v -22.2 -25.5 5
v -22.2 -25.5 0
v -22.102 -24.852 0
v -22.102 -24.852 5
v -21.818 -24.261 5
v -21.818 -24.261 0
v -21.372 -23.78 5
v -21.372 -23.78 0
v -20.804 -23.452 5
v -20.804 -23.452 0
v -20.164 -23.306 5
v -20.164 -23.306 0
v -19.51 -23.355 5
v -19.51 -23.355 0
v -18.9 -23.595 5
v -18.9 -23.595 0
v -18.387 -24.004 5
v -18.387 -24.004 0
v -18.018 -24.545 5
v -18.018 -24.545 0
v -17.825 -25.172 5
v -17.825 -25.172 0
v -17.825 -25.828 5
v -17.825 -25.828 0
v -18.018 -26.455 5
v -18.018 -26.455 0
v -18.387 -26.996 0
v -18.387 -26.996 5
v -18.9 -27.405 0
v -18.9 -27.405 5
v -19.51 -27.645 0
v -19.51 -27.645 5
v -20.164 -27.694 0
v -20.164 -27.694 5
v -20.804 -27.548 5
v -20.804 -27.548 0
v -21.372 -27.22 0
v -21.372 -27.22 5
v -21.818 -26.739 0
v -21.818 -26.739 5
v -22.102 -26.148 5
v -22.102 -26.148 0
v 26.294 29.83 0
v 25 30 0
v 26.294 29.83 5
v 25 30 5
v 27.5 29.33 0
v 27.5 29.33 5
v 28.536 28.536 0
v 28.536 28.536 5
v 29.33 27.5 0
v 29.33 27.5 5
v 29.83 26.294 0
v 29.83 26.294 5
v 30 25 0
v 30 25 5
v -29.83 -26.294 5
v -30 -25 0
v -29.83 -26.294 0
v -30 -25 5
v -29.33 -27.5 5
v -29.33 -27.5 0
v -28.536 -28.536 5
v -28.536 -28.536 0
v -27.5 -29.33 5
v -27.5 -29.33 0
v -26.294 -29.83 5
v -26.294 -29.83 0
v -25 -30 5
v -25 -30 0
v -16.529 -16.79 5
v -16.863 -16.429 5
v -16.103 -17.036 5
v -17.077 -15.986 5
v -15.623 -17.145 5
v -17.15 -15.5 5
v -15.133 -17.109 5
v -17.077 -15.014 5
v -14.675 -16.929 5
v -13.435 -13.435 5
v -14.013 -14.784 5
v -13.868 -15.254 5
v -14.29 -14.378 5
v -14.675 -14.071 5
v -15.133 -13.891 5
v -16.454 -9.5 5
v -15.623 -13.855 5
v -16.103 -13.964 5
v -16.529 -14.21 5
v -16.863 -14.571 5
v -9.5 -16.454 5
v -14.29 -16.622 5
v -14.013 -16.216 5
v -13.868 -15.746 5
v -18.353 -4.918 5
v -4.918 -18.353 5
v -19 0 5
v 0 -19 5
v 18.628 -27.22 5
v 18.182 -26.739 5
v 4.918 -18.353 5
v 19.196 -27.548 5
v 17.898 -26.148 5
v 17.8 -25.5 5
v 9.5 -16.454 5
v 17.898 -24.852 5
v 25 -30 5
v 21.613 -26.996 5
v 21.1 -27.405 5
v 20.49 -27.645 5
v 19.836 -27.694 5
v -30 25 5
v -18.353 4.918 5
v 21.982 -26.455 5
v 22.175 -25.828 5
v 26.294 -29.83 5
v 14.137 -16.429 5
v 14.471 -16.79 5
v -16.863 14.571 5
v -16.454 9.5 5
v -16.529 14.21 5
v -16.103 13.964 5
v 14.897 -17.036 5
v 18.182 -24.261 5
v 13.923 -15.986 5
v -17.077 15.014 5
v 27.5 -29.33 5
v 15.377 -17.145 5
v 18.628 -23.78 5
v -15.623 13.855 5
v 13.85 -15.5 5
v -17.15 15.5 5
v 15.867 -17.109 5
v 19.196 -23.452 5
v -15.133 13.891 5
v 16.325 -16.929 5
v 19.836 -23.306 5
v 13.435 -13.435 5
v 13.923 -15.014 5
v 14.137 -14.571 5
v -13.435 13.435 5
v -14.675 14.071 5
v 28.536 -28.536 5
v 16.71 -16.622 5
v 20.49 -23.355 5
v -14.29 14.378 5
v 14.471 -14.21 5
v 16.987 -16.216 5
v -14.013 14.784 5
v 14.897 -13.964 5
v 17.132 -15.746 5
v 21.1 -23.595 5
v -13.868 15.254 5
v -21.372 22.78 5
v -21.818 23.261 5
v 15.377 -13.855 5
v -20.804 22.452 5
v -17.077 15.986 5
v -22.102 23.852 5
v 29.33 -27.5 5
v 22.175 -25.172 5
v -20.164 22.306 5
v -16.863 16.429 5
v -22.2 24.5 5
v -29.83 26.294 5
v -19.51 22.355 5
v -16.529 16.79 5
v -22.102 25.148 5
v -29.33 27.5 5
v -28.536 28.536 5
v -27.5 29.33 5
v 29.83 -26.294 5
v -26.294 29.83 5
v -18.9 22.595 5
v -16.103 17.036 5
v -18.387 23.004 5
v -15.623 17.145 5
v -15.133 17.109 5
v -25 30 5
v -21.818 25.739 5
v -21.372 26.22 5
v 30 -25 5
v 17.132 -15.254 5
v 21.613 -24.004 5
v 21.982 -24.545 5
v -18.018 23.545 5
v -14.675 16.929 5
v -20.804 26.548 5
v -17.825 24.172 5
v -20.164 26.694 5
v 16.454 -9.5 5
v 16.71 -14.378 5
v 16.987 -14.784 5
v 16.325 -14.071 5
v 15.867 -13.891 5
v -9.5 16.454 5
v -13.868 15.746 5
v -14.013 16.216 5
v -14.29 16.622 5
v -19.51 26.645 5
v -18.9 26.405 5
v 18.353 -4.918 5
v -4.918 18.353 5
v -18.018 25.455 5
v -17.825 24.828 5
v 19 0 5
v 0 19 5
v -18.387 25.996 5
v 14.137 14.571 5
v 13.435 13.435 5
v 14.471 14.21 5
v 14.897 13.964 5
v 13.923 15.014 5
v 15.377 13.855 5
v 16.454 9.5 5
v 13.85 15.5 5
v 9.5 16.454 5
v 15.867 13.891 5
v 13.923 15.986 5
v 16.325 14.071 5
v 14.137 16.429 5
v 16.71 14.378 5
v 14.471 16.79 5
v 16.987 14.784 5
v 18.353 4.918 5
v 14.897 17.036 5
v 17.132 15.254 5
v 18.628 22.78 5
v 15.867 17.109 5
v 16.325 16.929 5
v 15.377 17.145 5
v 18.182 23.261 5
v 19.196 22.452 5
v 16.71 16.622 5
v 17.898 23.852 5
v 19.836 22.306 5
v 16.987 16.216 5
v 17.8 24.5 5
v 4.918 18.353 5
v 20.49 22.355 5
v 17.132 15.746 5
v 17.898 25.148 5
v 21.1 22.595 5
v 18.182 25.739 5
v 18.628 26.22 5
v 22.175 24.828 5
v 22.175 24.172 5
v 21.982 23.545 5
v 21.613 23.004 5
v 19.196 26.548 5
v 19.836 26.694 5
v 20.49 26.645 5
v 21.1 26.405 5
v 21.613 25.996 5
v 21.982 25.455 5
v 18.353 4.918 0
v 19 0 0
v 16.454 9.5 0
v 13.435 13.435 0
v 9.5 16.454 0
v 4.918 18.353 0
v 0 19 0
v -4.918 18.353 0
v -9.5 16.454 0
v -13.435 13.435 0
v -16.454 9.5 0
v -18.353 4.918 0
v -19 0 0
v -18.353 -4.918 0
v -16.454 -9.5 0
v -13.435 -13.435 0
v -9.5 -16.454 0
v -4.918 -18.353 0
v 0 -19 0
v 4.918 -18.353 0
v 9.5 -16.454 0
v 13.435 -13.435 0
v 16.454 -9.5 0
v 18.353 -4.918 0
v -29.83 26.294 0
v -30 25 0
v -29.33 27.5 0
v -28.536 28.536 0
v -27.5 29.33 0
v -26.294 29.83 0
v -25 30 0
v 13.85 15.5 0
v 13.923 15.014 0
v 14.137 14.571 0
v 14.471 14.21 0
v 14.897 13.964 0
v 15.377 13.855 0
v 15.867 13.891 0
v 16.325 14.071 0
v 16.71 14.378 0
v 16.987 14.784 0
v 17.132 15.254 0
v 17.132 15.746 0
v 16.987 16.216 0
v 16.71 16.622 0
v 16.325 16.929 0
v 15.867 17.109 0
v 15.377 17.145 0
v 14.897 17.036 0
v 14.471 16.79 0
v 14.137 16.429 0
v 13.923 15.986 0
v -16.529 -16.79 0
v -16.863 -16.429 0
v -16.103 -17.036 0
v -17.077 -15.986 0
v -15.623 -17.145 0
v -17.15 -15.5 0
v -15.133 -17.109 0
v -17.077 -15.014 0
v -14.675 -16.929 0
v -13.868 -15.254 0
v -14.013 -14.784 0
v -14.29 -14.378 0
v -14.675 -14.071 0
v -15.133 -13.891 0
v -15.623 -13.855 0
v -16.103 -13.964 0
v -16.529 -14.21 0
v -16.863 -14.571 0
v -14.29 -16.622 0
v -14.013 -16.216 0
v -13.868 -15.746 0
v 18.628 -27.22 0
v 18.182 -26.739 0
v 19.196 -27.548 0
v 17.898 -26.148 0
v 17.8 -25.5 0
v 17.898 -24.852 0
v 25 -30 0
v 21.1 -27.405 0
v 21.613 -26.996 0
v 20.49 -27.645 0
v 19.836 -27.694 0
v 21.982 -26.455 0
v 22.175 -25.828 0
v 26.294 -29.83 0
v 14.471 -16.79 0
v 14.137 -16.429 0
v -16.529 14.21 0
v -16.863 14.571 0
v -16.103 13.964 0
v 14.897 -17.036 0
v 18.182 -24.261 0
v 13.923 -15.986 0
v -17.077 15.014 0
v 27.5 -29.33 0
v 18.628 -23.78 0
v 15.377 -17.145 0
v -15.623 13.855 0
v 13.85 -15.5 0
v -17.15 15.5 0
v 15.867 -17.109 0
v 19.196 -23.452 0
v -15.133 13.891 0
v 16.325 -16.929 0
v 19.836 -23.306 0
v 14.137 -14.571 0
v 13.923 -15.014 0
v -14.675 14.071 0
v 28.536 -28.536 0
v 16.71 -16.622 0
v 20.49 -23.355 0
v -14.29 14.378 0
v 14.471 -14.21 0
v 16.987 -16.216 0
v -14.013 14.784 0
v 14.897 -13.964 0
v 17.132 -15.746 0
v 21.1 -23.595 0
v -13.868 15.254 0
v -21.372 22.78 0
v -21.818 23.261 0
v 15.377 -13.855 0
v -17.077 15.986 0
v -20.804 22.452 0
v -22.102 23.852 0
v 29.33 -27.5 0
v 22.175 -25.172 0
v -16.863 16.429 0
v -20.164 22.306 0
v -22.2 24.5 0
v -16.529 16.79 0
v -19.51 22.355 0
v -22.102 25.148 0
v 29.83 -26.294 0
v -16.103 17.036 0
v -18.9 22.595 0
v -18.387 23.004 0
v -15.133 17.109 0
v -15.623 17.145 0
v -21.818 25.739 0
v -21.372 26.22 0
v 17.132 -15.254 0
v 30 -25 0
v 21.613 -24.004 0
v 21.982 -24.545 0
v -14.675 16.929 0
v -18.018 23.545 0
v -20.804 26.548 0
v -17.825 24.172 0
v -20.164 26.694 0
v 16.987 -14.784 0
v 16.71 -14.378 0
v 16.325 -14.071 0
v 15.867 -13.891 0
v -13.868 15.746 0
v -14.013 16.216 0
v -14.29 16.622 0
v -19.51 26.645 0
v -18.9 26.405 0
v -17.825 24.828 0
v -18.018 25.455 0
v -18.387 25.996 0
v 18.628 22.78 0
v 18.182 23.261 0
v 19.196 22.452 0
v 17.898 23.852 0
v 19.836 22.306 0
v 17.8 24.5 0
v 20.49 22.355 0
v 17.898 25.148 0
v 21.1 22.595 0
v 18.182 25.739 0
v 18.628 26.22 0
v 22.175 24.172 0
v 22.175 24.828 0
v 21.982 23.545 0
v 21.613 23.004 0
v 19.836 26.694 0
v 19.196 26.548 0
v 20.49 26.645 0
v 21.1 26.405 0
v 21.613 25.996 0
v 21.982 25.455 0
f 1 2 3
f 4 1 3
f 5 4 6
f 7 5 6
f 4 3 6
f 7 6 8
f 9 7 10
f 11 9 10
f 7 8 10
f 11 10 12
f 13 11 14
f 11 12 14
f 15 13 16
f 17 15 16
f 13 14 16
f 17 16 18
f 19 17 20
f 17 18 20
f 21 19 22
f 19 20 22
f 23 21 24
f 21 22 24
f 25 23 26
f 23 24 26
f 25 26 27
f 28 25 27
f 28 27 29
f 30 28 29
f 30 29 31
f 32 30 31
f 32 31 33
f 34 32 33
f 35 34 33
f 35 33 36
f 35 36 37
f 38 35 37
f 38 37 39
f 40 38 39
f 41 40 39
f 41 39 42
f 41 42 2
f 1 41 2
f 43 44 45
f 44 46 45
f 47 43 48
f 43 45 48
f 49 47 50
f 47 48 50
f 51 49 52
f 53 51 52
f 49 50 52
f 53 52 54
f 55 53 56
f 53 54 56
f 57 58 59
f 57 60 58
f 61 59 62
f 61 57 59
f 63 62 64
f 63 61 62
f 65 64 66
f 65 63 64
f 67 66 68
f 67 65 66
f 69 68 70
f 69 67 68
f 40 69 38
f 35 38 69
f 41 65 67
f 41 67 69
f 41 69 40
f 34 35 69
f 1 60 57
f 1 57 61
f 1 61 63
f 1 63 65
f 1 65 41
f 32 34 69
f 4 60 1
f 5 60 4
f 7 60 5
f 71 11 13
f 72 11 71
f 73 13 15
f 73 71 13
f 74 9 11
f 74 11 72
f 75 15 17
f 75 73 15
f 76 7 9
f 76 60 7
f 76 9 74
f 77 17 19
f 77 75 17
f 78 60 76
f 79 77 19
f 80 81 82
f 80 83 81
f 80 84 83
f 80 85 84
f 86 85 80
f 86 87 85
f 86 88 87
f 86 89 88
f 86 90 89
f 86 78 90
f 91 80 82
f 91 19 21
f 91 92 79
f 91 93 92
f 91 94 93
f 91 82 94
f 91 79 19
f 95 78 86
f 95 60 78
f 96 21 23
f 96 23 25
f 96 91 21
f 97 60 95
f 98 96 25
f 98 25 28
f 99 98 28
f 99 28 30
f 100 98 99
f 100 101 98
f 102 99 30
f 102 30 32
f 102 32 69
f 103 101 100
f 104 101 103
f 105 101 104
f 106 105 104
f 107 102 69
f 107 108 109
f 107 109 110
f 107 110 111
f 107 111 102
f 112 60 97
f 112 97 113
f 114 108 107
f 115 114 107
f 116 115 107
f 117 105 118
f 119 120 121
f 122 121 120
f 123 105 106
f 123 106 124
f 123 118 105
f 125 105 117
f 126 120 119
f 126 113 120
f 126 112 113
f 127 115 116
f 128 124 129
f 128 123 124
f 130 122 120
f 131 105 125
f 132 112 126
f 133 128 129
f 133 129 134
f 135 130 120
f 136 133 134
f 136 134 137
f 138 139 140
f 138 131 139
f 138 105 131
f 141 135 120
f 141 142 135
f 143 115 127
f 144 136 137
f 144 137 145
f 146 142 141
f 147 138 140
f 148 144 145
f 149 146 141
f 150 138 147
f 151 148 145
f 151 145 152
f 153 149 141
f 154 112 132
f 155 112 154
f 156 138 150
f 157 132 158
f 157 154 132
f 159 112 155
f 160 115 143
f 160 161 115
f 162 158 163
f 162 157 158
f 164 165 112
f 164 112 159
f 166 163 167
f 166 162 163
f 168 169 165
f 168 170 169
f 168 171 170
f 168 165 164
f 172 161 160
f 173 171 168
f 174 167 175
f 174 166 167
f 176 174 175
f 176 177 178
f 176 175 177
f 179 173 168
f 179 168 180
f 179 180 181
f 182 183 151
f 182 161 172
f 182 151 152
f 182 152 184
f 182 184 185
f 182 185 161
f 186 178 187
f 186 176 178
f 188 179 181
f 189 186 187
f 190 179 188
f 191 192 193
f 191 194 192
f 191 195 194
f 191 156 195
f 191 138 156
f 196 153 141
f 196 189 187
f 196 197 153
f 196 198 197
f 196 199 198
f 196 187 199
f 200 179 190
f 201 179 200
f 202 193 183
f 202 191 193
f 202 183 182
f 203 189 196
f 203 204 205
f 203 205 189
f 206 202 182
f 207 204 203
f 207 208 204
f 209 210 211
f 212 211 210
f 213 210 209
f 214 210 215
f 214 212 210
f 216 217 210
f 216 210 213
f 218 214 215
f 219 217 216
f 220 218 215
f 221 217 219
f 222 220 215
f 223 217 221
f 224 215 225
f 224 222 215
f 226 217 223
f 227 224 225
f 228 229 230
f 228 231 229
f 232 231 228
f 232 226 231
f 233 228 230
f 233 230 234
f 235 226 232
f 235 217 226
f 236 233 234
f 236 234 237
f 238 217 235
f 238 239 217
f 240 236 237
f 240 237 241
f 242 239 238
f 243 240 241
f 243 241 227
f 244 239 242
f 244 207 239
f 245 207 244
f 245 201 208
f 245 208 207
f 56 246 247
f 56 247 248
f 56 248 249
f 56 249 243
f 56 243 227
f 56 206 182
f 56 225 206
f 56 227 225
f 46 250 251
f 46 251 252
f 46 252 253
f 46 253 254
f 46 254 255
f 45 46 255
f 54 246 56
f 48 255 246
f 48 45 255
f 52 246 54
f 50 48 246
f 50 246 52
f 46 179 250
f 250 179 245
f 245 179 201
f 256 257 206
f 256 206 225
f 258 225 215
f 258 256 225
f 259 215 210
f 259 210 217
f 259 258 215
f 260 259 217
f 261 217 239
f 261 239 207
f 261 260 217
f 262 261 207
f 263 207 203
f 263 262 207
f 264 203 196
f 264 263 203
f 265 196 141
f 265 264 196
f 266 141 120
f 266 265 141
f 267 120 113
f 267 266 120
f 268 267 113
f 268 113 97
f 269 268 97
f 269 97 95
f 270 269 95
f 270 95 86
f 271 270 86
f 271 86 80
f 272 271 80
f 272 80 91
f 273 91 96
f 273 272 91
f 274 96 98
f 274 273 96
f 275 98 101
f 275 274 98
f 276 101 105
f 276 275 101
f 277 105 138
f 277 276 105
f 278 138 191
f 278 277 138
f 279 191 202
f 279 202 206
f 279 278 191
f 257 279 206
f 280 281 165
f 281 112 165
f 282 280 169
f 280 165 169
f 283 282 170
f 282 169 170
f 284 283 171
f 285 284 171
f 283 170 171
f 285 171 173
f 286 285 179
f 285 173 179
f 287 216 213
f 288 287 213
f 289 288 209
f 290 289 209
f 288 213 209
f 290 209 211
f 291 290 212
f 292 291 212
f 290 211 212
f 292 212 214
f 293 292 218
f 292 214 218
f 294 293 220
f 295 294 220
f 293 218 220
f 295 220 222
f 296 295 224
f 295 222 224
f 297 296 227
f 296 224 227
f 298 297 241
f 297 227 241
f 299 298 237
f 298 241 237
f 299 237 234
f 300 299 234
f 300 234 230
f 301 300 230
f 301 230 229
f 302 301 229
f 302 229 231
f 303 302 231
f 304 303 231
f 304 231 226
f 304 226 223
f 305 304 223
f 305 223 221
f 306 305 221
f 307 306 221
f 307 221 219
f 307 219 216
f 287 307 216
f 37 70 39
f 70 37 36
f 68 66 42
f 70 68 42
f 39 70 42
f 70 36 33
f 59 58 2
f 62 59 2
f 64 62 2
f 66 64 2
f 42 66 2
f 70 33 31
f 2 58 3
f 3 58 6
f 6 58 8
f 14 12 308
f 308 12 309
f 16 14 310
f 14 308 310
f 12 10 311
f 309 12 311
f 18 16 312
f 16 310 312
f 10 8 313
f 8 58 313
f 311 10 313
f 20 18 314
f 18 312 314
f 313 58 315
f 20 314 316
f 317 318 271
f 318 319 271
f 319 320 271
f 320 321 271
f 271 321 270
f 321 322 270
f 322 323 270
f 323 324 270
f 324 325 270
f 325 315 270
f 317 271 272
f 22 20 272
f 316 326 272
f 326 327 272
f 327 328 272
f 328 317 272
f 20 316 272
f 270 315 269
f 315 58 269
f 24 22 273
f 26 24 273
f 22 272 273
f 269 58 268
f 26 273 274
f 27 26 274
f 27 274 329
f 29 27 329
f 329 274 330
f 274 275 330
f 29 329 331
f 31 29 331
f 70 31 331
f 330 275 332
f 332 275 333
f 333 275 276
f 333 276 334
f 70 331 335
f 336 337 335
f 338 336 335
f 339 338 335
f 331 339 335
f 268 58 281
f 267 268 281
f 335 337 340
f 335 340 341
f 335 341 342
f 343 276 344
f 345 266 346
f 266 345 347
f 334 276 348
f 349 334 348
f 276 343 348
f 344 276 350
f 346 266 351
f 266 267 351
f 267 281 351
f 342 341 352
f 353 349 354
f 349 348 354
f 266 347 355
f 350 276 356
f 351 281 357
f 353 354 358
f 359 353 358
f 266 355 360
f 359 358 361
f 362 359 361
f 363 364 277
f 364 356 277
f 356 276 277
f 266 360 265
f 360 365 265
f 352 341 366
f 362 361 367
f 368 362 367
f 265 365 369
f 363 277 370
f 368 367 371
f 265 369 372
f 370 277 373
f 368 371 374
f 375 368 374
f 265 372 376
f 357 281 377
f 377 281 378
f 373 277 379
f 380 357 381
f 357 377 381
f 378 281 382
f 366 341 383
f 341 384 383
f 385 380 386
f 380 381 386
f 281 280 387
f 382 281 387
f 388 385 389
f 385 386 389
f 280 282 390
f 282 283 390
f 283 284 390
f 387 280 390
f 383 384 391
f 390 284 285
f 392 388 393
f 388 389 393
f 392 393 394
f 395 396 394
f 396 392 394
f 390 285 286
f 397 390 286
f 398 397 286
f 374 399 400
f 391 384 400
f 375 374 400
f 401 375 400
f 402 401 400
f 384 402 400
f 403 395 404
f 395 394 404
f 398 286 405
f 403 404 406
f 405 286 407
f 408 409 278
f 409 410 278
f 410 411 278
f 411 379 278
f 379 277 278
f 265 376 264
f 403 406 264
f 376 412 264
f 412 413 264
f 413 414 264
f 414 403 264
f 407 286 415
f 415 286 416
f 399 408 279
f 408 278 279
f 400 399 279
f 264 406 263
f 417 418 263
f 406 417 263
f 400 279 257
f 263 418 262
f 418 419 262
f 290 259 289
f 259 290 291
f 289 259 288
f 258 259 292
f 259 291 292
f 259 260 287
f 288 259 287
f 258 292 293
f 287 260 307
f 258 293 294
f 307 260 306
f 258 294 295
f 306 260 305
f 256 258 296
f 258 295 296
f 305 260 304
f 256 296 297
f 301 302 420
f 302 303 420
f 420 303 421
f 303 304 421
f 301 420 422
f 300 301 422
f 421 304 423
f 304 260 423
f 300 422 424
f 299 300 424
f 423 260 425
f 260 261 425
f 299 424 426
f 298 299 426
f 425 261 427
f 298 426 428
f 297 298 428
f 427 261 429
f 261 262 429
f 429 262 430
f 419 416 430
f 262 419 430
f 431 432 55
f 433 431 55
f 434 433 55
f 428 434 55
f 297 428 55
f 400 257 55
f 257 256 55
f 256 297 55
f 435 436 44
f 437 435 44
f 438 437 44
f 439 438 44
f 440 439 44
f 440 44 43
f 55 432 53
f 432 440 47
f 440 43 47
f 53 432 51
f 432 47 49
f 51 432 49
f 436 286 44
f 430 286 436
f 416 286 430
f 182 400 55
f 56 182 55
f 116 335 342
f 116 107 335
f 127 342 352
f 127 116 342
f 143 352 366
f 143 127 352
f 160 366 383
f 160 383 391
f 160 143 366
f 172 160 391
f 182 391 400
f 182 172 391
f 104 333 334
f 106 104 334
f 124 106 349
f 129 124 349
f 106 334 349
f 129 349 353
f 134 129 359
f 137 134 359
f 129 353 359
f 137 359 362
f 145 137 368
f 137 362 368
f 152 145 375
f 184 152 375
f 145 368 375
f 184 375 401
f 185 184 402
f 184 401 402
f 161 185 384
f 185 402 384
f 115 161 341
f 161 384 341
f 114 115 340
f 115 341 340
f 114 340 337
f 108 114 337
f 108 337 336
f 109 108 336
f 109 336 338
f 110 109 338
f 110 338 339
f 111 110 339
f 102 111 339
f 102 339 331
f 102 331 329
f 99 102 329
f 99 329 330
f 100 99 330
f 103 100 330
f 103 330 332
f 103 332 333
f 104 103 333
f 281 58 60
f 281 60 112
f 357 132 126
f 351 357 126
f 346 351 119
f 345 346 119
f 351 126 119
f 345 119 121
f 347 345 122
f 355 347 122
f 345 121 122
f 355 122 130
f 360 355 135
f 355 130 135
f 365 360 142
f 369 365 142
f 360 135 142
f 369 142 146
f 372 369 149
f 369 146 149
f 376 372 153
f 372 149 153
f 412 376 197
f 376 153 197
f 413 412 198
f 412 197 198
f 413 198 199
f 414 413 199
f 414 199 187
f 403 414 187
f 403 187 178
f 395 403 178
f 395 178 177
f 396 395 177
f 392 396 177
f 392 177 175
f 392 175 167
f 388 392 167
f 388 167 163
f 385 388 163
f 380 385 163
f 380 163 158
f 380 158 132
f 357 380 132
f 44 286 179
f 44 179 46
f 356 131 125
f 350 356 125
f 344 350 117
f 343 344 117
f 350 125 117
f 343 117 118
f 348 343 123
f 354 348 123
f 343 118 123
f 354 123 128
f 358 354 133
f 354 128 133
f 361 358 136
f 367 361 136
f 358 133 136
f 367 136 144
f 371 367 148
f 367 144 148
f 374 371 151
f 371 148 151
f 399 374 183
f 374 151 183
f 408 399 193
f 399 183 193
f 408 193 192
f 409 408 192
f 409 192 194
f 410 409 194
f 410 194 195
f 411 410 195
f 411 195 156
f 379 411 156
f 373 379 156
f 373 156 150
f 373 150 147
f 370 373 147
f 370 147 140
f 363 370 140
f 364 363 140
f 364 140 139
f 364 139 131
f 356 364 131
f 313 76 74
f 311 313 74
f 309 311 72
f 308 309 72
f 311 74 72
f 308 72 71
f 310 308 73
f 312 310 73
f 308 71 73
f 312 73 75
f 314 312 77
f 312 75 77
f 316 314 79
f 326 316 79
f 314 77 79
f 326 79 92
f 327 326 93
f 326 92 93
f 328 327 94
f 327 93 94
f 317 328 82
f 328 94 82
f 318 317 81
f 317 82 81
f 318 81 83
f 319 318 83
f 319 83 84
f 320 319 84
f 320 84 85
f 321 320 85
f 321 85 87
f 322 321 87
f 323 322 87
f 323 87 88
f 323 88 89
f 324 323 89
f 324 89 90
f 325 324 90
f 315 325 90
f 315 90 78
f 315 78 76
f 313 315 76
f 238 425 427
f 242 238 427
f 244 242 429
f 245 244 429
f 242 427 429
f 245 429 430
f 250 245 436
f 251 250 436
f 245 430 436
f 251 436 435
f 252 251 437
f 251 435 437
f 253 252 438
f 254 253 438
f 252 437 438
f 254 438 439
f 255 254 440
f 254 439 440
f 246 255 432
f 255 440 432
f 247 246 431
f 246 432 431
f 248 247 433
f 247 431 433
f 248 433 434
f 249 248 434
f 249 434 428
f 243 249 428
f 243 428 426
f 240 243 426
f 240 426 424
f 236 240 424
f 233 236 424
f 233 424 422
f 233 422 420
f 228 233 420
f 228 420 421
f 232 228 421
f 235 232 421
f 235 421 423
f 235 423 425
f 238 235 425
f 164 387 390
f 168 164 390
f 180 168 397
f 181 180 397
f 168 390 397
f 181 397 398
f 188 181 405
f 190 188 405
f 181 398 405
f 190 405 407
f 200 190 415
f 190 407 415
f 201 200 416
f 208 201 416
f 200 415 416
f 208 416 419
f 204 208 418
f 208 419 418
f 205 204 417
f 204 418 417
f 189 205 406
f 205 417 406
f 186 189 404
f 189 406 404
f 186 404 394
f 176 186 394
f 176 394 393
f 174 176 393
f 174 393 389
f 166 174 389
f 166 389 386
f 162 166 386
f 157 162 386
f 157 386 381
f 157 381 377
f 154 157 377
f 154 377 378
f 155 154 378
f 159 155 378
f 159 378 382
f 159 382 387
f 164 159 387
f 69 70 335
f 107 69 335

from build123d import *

# Parameters (mm, degrees)
F0_W     = 60
F0_H     = 60
F0_R     = 19
F1_DEPTH = 5
F2_D     = 3.3
F2_DEPTH = 13.8
F2_TIP   = 0.9914200214
F4_D     = 4.4
F4_DEPTH = 13.8
F4_TIP   = 1.3218933619
F5_R     = 5


with BuildPart() as f1:
    # F0 (on Top) → F1 (new body)
    with BuildSketch(Plane.XY):
        Rectangle(F0_W, F0_H)
        Circle(F0_R, mode=Mode.SUBTRACT)
    extrude(amount=F1_DEPTH)

    # F2
    with Locations(Plane(origin=(0, 0, 0), x_dir=(1, 0, 0), z_dir=(0, 0, -1))):
        with Locations((-15.5, -15.5), (15.5, -15.5), (15.5, 15.5), (-15.5, 15.5)):
            Hole(F2_D / 2, depth=F2_DEPTH)
            with Locations((0, 0, -(F2_DEPTH + F2_TIP / 2))):  # 118° drill point
                Cone(0, F2_D / 2, F2_TIP, mode=Mode.SUBTRACT)

    # F4
    with Locations(Plane.XY.offset(5)):
        with Locations((-20, 24.5), (20, 24.5), (20, -25.5), (-20, -25.5)):
            Hole(F4_D / 2, depth=F4_DEPTH)
            with Locations((0, 0, -(F4_DEPTH + F4_TIP / 2))):  # 118° drill point
                Cone(0, F4_D / 2, F4_TIP, mode=Mode.SUBTRACT)

    # F5
    f5_edges = [f1.edges().sort_by_distance(p)[0] for p in [
        (-30, 30, 2.5),
        (30, 30, 2.5),
        (30, -30, 2.5),
        (-30, -30, 2.5),
    ]]
    fillet(f5_edges, radius=F5_R)


solid = f1.part
